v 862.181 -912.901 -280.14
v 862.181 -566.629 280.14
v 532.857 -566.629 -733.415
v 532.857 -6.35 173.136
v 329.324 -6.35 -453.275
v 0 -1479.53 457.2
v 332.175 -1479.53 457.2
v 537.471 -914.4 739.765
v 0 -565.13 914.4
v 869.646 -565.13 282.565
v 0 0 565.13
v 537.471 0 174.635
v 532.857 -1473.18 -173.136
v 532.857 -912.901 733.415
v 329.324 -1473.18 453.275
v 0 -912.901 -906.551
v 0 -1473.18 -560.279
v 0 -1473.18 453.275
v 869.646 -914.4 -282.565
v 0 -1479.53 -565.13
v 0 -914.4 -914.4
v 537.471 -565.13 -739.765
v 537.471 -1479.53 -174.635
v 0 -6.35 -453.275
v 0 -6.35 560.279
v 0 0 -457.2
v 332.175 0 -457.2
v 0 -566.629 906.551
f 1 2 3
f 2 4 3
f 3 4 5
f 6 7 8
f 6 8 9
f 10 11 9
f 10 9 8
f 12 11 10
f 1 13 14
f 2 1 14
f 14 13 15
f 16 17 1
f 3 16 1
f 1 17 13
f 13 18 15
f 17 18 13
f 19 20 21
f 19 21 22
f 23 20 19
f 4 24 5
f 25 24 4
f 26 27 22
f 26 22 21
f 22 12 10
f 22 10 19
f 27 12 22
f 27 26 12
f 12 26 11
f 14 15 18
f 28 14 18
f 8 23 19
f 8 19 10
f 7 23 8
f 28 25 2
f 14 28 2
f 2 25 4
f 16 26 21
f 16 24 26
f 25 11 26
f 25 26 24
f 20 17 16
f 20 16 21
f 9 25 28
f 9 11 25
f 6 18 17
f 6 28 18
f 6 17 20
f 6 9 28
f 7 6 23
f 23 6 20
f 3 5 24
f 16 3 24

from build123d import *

# Parameters (mm, degrees)
F3_ANGLE = 180
F8_DEPTH = 869.6470786003
F9_T     = -6.35


with BuildPart() as f2:
    # F0 (on Front) → F2 section 0
    with BuildSketch(Plane.XZ, mode=Mode.PRIVATE) as f2_s0:
        Polygon((0, -1479.5302793129), (1407.1169131965, -457.2), (869.6460785003, 1196.9651396565), (-869.6460785003, 1196.9651396565), (-1258.5636280788, 0), (-1407.1169131965, -457.2), align=None)
    loft([f2_s0.sketch, Vertex(0, -2393.9302793129, 0)])


with BuildPart() as f3_1:
    # F3: copy of F2
    add(f2.part.rotate(Axis((98.339766264, -739.7651396565, 0), (1, 0, 0)), F3_ANGLE))


with BuildPart() as f2_1:
    add(f2.part)

    # F4: intersect F3_1
    add(f3_1.part, mode=Mode.INTERSECT)

    # F7 (on 3pt) → F8 (cut, through all)
    with BuildSketch(Plane(origin=(0, 0, 0), x_dir=(0, -1, 0), z_dir=(-1, 0, 0))):
        Polygon((1784.3302793129, 645.576759771), (549.4445933651, 1263.0196027449), (-304.8, 735.0674093394), (-304.8, -441.1666341224), (904.9484231668, -1278.5552855277), (1784.3302793129, -735.0674093394), align=None)
        Polygon((0, 565.1302793129), (565.1302793129, 914.4), (1479.5302793129, 457.2), (1479.5302793129, -565.1302793129), (914.4, -914.4), (0, -281.4517206871), align=None, mode=Mode.SUBTRACT)
        Polygon((1479.5302793129, 457.2), (565.1302793129, 914.4), (0, 565.1302793129), (0, -281.4517206871), (914.4, -914.4), (1479.5302793129, -565.1302793129), align=None)
    extrude(amount=F8_DEPTH, mode=Mode.SUBTRACT)

    # F9
    f9_openings = [f2_1.faces().sort_by_distance(p)[0] for p in [
        (0, -739.76514, 0),
    ]]
    offset(amount=F9_T, openings=f9_openings)


solid = f2_1.part
